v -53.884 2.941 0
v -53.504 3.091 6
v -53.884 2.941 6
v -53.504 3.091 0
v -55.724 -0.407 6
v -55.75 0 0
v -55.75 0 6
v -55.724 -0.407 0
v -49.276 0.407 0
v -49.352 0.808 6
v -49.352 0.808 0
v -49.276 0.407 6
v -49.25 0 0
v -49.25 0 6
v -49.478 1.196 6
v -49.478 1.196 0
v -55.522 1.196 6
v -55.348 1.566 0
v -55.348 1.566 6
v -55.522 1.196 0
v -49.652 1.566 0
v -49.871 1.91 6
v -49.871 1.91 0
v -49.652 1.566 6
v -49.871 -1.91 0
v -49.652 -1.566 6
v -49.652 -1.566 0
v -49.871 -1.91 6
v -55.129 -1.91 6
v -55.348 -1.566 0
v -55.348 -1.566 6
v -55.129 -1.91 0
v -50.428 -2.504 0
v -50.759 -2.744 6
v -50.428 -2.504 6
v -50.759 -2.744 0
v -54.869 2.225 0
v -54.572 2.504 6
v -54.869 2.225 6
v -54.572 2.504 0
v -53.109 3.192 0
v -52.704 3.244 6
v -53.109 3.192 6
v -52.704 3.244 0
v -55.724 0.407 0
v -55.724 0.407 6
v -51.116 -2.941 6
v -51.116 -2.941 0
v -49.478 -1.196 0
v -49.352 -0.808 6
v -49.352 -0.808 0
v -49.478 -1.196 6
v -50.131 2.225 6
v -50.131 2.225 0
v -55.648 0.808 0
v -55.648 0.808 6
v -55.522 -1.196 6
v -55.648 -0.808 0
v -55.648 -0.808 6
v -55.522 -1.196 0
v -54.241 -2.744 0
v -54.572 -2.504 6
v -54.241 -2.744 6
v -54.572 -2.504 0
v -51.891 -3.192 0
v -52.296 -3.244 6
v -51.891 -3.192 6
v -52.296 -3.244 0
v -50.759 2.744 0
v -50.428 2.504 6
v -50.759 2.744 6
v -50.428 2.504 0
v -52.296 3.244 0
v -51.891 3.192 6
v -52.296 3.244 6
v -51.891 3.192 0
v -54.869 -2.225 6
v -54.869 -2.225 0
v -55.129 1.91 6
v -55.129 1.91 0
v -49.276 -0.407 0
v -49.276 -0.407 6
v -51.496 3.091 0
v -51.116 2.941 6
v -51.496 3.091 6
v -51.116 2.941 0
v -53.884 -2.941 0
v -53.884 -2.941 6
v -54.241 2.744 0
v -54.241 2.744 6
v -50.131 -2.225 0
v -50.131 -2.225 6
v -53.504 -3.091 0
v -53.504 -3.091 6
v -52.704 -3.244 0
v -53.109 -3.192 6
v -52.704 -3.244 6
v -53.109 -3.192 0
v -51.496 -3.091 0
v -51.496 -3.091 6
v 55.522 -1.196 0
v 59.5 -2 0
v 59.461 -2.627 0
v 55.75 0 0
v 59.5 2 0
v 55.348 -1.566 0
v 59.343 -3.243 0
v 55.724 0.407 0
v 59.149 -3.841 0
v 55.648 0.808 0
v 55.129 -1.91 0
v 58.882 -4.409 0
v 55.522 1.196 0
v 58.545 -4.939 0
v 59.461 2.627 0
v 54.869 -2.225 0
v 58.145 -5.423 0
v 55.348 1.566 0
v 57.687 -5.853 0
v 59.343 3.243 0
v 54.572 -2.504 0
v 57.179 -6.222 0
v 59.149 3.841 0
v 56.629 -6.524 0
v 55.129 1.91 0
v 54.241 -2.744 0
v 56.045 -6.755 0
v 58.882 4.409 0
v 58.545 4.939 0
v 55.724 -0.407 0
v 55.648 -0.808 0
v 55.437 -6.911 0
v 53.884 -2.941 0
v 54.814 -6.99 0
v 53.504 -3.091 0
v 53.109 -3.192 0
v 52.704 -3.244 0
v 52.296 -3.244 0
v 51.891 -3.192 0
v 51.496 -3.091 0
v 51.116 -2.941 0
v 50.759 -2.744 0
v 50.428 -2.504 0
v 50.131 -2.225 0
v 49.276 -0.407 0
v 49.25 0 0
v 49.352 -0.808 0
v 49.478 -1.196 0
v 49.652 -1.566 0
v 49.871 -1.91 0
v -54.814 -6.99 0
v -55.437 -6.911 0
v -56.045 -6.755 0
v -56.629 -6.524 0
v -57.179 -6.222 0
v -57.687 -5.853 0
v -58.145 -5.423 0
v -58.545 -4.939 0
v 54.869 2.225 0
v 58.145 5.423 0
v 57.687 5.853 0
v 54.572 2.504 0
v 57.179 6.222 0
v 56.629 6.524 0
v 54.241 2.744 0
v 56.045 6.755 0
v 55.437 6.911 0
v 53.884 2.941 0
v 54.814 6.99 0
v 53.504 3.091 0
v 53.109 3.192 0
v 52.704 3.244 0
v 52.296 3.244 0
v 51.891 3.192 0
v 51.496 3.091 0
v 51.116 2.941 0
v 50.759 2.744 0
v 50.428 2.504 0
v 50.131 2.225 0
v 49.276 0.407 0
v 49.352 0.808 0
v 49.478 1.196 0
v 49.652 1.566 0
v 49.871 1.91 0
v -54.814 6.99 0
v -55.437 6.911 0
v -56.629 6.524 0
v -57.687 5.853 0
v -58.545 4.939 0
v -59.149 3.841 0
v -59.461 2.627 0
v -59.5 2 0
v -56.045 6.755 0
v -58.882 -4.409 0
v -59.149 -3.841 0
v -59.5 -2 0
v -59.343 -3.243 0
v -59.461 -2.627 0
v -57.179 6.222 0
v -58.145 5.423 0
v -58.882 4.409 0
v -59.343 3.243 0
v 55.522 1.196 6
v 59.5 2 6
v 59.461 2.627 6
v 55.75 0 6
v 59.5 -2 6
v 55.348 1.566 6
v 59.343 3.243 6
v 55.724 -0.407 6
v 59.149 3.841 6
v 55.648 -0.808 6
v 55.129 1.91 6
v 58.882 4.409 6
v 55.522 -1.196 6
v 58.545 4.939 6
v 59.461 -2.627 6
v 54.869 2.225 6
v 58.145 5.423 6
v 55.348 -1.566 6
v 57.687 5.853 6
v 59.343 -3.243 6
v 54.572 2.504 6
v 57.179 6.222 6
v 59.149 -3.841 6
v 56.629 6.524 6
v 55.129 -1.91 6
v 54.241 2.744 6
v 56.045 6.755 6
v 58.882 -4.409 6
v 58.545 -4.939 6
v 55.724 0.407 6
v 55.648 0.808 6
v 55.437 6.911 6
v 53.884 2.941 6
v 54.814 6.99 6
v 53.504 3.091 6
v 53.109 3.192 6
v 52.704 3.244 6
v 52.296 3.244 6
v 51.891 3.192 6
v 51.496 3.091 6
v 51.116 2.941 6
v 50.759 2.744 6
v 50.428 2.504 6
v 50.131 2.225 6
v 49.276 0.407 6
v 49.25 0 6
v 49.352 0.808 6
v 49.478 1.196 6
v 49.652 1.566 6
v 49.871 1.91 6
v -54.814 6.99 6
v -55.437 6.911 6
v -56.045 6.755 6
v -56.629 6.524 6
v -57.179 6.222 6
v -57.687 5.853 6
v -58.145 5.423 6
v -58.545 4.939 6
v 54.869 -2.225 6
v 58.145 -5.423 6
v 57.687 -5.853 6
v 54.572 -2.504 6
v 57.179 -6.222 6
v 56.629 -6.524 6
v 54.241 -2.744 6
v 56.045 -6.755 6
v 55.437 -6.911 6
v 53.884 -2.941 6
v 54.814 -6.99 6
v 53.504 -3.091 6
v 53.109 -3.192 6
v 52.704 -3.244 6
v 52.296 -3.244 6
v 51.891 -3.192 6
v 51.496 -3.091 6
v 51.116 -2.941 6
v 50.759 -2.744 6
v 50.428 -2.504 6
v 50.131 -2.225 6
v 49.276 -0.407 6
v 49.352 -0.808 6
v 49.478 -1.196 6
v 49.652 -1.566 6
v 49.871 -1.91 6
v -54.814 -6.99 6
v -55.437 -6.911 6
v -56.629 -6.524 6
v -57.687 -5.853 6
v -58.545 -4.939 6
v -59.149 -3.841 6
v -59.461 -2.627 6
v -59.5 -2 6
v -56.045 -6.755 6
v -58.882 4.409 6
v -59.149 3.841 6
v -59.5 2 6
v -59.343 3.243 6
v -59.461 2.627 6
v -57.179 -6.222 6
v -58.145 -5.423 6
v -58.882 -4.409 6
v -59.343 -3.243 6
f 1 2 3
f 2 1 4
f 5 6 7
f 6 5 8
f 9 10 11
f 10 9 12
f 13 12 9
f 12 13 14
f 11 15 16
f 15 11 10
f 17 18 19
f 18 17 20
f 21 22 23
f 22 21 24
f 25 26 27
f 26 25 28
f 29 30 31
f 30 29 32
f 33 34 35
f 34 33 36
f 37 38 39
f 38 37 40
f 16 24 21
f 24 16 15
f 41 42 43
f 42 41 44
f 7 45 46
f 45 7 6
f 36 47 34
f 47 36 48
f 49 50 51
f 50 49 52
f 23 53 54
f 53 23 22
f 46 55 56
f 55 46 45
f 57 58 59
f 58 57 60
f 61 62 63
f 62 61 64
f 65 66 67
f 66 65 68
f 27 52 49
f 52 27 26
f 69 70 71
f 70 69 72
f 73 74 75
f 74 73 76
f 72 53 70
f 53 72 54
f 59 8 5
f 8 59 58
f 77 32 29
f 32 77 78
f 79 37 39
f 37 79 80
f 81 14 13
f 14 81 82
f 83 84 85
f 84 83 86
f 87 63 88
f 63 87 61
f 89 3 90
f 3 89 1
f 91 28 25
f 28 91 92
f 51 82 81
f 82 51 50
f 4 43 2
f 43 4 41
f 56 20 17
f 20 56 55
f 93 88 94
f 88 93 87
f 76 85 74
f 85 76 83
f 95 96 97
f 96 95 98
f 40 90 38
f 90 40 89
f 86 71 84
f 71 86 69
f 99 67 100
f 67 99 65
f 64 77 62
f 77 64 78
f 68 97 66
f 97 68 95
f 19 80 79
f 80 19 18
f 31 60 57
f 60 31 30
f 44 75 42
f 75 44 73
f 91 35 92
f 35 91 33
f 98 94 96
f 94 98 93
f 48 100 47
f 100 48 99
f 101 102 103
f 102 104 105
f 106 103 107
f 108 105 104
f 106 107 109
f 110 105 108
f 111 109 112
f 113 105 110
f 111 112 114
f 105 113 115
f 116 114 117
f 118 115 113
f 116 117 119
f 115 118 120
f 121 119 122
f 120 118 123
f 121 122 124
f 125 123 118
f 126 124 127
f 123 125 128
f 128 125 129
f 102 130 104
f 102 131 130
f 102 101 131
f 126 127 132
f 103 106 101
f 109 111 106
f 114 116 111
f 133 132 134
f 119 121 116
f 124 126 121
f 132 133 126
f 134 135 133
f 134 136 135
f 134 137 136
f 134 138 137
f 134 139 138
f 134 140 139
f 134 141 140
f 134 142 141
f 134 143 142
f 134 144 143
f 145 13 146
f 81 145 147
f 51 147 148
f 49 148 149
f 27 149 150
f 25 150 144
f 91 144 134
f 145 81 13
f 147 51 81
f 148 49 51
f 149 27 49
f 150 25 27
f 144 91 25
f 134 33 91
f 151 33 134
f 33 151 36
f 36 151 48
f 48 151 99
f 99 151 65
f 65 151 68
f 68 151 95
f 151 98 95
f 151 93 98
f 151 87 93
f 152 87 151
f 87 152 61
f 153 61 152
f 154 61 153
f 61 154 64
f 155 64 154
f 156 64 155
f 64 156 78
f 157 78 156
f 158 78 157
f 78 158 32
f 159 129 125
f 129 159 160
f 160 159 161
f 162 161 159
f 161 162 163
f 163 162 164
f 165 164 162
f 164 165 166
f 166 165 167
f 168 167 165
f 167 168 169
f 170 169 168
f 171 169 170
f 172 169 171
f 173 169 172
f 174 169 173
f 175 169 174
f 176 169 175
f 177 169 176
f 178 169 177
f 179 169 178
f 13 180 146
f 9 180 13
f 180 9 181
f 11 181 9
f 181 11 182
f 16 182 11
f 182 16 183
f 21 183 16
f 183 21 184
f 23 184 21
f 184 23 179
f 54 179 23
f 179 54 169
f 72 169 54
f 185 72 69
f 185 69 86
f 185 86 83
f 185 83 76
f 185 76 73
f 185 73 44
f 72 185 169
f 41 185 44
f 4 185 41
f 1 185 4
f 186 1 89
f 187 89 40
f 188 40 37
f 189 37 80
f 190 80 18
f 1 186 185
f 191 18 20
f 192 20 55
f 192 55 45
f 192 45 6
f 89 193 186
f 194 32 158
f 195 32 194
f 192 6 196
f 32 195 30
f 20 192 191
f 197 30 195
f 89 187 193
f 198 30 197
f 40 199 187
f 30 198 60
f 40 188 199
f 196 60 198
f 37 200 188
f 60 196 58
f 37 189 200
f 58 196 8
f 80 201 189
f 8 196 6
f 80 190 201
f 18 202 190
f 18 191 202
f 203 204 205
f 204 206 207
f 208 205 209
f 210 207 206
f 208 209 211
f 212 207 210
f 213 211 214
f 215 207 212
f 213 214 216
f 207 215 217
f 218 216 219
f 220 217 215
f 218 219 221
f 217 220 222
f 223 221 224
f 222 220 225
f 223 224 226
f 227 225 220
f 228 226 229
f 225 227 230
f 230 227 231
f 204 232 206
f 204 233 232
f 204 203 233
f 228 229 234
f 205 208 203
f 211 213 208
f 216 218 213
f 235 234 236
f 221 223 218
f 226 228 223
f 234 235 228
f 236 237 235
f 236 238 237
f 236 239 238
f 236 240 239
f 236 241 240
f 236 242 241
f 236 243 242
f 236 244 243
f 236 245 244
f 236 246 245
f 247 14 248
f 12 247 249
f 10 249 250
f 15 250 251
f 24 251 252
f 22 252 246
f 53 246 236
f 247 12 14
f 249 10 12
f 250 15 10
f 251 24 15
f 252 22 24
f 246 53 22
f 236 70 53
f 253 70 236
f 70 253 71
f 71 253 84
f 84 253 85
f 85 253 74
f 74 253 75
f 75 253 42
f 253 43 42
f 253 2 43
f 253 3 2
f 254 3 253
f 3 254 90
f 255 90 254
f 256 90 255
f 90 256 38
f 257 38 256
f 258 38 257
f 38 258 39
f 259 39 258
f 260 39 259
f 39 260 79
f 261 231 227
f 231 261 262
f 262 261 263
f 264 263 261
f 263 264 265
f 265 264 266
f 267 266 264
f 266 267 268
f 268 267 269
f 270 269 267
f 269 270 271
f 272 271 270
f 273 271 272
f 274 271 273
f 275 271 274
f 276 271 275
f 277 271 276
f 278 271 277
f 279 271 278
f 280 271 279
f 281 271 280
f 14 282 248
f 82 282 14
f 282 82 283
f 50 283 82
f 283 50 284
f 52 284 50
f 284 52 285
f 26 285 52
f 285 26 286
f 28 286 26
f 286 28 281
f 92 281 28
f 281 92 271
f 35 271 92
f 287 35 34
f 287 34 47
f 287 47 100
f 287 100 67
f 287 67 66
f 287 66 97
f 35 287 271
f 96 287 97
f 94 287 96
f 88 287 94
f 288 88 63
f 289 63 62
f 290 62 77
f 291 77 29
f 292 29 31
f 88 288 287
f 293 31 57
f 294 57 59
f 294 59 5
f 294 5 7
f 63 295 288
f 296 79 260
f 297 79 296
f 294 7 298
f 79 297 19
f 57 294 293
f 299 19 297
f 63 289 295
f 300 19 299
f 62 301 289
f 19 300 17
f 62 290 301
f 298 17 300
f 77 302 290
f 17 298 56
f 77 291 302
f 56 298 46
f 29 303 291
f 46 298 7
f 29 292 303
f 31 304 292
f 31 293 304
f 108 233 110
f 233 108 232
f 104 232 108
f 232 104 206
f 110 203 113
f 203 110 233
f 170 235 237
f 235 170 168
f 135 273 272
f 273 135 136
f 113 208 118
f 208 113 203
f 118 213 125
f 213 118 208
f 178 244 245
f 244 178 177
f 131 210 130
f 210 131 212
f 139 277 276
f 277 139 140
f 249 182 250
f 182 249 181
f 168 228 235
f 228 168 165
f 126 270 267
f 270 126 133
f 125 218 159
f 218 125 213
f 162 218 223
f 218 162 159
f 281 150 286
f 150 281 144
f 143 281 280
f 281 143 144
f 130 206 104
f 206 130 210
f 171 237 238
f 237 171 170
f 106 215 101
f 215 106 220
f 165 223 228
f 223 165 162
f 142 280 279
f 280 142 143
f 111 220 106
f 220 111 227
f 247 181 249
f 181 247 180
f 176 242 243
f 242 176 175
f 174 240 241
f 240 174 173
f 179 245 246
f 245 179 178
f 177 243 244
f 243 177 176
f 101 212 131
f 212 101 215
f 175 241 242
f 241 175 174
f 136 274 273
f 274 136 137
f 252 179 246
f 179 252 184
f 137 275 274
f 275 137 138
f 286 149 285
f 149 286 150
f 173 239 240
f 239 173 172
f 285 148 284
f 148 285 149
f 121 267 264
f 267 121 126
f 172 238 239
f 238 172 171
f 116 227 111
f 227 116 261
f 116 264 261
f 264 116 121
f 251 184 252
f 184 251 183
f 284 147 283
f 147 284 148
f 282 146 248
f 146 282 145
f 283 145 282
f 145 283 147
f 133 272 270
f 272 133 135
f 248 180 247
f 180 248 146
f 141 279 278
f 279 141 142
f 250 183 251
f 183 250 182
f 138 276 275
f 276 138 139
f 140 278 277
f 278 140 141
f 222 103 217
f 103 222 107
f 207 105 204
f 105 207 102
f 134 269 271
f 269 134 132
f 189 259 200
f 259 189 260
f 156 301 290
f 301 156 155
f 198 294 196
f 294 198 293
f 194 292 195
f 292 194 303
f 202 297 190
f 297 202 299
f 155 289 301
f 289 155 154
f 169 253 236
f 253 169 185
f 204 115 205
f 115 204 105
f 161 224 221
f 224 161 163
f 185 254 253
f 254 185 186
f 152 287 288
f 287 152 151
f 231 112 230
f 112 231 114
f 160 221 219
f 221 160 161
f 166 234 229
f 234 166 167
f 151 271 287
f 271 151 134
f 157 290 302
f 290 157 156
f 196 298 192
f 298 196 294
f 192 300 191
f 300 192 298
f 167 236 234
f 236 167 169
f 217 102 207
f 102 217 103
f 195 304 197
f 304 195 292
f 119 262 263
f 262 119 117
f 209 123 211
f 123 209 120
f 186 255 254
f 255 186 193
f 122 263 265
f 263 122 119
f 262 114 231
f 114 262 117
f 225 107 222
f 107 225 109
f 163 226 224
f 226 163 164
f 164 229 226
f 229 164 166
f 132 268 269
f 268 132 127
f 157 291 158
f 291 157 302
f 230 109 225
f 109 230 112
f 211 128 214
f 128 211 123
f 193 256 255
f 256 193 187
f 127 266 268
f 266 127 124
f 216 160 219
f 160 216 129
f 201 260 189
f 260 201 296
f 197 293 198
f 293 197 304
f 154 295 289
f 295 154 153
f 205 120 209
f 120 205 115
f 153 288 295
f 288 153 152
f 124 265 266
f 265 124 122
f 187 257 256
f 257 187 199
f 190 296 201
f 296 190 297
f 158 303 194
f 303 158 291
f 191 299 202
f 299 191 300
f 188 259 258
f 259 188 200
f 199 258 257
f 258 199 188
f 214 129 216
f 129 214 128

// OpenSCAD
$fn = 50;


difference() {
	union() {
		hull() {
			translate(v = [-54.5000000000, 2.0000000000, 0]) {
				cylinder(h = 6, r = 5);
			}
			translate(v = [54.5000000000, 2.0000000000, 0]) {
				cylinder(h = 6, r = 5);
			}
			translate(v = [-54.5000000000, -2.0000000000, 0]) {
				cylinder(h = 6, r = 5);
			}
			translate(v = [54.5000000000, -2.0000000000, 0]) {
				cylinder(h = 6, r = 5);
			}
		}
	}
	union() {
		translate(v = [-52.5000000000, 0.0000000000, 0]) {
			cylinder(h = 6, r = 3.2500000000);
		}
		translate(v = [52.5000000000, 0.0000000000, 0]) {
			cylinder(h = 6, r = 3.2500000000);
		}
		translate(v = [-52.5000000000, 0.0000000000, 0]) {
			cylinder(h = 6, r = 1.8000000000);
		}
		translate(v = [52.5000000000, 0.0000000000, 0]) {
			cylinder(h = 6, r = 1.8000000000);
		}
		translate(v = [-52.5000000000, 0.0000000000, 0]) {
			cylinder(h = 6, r = 1.8000000000);
		}
		translate(v = [52.5000000000, 0.0000000000, 0]) {
			cylinder(h = 6, r = 1.8000000000);
		}
		translate(v = [-52.5000000000, 0.0000000000, 0]) {
			cylinder(h = 6, r = 1.8000000000);
		}
		translate(v = [52.5000000000, 0.0000000000, 0]) {
			cylinder(h = 6, r = 1.8000000000);
		}
	}
}
